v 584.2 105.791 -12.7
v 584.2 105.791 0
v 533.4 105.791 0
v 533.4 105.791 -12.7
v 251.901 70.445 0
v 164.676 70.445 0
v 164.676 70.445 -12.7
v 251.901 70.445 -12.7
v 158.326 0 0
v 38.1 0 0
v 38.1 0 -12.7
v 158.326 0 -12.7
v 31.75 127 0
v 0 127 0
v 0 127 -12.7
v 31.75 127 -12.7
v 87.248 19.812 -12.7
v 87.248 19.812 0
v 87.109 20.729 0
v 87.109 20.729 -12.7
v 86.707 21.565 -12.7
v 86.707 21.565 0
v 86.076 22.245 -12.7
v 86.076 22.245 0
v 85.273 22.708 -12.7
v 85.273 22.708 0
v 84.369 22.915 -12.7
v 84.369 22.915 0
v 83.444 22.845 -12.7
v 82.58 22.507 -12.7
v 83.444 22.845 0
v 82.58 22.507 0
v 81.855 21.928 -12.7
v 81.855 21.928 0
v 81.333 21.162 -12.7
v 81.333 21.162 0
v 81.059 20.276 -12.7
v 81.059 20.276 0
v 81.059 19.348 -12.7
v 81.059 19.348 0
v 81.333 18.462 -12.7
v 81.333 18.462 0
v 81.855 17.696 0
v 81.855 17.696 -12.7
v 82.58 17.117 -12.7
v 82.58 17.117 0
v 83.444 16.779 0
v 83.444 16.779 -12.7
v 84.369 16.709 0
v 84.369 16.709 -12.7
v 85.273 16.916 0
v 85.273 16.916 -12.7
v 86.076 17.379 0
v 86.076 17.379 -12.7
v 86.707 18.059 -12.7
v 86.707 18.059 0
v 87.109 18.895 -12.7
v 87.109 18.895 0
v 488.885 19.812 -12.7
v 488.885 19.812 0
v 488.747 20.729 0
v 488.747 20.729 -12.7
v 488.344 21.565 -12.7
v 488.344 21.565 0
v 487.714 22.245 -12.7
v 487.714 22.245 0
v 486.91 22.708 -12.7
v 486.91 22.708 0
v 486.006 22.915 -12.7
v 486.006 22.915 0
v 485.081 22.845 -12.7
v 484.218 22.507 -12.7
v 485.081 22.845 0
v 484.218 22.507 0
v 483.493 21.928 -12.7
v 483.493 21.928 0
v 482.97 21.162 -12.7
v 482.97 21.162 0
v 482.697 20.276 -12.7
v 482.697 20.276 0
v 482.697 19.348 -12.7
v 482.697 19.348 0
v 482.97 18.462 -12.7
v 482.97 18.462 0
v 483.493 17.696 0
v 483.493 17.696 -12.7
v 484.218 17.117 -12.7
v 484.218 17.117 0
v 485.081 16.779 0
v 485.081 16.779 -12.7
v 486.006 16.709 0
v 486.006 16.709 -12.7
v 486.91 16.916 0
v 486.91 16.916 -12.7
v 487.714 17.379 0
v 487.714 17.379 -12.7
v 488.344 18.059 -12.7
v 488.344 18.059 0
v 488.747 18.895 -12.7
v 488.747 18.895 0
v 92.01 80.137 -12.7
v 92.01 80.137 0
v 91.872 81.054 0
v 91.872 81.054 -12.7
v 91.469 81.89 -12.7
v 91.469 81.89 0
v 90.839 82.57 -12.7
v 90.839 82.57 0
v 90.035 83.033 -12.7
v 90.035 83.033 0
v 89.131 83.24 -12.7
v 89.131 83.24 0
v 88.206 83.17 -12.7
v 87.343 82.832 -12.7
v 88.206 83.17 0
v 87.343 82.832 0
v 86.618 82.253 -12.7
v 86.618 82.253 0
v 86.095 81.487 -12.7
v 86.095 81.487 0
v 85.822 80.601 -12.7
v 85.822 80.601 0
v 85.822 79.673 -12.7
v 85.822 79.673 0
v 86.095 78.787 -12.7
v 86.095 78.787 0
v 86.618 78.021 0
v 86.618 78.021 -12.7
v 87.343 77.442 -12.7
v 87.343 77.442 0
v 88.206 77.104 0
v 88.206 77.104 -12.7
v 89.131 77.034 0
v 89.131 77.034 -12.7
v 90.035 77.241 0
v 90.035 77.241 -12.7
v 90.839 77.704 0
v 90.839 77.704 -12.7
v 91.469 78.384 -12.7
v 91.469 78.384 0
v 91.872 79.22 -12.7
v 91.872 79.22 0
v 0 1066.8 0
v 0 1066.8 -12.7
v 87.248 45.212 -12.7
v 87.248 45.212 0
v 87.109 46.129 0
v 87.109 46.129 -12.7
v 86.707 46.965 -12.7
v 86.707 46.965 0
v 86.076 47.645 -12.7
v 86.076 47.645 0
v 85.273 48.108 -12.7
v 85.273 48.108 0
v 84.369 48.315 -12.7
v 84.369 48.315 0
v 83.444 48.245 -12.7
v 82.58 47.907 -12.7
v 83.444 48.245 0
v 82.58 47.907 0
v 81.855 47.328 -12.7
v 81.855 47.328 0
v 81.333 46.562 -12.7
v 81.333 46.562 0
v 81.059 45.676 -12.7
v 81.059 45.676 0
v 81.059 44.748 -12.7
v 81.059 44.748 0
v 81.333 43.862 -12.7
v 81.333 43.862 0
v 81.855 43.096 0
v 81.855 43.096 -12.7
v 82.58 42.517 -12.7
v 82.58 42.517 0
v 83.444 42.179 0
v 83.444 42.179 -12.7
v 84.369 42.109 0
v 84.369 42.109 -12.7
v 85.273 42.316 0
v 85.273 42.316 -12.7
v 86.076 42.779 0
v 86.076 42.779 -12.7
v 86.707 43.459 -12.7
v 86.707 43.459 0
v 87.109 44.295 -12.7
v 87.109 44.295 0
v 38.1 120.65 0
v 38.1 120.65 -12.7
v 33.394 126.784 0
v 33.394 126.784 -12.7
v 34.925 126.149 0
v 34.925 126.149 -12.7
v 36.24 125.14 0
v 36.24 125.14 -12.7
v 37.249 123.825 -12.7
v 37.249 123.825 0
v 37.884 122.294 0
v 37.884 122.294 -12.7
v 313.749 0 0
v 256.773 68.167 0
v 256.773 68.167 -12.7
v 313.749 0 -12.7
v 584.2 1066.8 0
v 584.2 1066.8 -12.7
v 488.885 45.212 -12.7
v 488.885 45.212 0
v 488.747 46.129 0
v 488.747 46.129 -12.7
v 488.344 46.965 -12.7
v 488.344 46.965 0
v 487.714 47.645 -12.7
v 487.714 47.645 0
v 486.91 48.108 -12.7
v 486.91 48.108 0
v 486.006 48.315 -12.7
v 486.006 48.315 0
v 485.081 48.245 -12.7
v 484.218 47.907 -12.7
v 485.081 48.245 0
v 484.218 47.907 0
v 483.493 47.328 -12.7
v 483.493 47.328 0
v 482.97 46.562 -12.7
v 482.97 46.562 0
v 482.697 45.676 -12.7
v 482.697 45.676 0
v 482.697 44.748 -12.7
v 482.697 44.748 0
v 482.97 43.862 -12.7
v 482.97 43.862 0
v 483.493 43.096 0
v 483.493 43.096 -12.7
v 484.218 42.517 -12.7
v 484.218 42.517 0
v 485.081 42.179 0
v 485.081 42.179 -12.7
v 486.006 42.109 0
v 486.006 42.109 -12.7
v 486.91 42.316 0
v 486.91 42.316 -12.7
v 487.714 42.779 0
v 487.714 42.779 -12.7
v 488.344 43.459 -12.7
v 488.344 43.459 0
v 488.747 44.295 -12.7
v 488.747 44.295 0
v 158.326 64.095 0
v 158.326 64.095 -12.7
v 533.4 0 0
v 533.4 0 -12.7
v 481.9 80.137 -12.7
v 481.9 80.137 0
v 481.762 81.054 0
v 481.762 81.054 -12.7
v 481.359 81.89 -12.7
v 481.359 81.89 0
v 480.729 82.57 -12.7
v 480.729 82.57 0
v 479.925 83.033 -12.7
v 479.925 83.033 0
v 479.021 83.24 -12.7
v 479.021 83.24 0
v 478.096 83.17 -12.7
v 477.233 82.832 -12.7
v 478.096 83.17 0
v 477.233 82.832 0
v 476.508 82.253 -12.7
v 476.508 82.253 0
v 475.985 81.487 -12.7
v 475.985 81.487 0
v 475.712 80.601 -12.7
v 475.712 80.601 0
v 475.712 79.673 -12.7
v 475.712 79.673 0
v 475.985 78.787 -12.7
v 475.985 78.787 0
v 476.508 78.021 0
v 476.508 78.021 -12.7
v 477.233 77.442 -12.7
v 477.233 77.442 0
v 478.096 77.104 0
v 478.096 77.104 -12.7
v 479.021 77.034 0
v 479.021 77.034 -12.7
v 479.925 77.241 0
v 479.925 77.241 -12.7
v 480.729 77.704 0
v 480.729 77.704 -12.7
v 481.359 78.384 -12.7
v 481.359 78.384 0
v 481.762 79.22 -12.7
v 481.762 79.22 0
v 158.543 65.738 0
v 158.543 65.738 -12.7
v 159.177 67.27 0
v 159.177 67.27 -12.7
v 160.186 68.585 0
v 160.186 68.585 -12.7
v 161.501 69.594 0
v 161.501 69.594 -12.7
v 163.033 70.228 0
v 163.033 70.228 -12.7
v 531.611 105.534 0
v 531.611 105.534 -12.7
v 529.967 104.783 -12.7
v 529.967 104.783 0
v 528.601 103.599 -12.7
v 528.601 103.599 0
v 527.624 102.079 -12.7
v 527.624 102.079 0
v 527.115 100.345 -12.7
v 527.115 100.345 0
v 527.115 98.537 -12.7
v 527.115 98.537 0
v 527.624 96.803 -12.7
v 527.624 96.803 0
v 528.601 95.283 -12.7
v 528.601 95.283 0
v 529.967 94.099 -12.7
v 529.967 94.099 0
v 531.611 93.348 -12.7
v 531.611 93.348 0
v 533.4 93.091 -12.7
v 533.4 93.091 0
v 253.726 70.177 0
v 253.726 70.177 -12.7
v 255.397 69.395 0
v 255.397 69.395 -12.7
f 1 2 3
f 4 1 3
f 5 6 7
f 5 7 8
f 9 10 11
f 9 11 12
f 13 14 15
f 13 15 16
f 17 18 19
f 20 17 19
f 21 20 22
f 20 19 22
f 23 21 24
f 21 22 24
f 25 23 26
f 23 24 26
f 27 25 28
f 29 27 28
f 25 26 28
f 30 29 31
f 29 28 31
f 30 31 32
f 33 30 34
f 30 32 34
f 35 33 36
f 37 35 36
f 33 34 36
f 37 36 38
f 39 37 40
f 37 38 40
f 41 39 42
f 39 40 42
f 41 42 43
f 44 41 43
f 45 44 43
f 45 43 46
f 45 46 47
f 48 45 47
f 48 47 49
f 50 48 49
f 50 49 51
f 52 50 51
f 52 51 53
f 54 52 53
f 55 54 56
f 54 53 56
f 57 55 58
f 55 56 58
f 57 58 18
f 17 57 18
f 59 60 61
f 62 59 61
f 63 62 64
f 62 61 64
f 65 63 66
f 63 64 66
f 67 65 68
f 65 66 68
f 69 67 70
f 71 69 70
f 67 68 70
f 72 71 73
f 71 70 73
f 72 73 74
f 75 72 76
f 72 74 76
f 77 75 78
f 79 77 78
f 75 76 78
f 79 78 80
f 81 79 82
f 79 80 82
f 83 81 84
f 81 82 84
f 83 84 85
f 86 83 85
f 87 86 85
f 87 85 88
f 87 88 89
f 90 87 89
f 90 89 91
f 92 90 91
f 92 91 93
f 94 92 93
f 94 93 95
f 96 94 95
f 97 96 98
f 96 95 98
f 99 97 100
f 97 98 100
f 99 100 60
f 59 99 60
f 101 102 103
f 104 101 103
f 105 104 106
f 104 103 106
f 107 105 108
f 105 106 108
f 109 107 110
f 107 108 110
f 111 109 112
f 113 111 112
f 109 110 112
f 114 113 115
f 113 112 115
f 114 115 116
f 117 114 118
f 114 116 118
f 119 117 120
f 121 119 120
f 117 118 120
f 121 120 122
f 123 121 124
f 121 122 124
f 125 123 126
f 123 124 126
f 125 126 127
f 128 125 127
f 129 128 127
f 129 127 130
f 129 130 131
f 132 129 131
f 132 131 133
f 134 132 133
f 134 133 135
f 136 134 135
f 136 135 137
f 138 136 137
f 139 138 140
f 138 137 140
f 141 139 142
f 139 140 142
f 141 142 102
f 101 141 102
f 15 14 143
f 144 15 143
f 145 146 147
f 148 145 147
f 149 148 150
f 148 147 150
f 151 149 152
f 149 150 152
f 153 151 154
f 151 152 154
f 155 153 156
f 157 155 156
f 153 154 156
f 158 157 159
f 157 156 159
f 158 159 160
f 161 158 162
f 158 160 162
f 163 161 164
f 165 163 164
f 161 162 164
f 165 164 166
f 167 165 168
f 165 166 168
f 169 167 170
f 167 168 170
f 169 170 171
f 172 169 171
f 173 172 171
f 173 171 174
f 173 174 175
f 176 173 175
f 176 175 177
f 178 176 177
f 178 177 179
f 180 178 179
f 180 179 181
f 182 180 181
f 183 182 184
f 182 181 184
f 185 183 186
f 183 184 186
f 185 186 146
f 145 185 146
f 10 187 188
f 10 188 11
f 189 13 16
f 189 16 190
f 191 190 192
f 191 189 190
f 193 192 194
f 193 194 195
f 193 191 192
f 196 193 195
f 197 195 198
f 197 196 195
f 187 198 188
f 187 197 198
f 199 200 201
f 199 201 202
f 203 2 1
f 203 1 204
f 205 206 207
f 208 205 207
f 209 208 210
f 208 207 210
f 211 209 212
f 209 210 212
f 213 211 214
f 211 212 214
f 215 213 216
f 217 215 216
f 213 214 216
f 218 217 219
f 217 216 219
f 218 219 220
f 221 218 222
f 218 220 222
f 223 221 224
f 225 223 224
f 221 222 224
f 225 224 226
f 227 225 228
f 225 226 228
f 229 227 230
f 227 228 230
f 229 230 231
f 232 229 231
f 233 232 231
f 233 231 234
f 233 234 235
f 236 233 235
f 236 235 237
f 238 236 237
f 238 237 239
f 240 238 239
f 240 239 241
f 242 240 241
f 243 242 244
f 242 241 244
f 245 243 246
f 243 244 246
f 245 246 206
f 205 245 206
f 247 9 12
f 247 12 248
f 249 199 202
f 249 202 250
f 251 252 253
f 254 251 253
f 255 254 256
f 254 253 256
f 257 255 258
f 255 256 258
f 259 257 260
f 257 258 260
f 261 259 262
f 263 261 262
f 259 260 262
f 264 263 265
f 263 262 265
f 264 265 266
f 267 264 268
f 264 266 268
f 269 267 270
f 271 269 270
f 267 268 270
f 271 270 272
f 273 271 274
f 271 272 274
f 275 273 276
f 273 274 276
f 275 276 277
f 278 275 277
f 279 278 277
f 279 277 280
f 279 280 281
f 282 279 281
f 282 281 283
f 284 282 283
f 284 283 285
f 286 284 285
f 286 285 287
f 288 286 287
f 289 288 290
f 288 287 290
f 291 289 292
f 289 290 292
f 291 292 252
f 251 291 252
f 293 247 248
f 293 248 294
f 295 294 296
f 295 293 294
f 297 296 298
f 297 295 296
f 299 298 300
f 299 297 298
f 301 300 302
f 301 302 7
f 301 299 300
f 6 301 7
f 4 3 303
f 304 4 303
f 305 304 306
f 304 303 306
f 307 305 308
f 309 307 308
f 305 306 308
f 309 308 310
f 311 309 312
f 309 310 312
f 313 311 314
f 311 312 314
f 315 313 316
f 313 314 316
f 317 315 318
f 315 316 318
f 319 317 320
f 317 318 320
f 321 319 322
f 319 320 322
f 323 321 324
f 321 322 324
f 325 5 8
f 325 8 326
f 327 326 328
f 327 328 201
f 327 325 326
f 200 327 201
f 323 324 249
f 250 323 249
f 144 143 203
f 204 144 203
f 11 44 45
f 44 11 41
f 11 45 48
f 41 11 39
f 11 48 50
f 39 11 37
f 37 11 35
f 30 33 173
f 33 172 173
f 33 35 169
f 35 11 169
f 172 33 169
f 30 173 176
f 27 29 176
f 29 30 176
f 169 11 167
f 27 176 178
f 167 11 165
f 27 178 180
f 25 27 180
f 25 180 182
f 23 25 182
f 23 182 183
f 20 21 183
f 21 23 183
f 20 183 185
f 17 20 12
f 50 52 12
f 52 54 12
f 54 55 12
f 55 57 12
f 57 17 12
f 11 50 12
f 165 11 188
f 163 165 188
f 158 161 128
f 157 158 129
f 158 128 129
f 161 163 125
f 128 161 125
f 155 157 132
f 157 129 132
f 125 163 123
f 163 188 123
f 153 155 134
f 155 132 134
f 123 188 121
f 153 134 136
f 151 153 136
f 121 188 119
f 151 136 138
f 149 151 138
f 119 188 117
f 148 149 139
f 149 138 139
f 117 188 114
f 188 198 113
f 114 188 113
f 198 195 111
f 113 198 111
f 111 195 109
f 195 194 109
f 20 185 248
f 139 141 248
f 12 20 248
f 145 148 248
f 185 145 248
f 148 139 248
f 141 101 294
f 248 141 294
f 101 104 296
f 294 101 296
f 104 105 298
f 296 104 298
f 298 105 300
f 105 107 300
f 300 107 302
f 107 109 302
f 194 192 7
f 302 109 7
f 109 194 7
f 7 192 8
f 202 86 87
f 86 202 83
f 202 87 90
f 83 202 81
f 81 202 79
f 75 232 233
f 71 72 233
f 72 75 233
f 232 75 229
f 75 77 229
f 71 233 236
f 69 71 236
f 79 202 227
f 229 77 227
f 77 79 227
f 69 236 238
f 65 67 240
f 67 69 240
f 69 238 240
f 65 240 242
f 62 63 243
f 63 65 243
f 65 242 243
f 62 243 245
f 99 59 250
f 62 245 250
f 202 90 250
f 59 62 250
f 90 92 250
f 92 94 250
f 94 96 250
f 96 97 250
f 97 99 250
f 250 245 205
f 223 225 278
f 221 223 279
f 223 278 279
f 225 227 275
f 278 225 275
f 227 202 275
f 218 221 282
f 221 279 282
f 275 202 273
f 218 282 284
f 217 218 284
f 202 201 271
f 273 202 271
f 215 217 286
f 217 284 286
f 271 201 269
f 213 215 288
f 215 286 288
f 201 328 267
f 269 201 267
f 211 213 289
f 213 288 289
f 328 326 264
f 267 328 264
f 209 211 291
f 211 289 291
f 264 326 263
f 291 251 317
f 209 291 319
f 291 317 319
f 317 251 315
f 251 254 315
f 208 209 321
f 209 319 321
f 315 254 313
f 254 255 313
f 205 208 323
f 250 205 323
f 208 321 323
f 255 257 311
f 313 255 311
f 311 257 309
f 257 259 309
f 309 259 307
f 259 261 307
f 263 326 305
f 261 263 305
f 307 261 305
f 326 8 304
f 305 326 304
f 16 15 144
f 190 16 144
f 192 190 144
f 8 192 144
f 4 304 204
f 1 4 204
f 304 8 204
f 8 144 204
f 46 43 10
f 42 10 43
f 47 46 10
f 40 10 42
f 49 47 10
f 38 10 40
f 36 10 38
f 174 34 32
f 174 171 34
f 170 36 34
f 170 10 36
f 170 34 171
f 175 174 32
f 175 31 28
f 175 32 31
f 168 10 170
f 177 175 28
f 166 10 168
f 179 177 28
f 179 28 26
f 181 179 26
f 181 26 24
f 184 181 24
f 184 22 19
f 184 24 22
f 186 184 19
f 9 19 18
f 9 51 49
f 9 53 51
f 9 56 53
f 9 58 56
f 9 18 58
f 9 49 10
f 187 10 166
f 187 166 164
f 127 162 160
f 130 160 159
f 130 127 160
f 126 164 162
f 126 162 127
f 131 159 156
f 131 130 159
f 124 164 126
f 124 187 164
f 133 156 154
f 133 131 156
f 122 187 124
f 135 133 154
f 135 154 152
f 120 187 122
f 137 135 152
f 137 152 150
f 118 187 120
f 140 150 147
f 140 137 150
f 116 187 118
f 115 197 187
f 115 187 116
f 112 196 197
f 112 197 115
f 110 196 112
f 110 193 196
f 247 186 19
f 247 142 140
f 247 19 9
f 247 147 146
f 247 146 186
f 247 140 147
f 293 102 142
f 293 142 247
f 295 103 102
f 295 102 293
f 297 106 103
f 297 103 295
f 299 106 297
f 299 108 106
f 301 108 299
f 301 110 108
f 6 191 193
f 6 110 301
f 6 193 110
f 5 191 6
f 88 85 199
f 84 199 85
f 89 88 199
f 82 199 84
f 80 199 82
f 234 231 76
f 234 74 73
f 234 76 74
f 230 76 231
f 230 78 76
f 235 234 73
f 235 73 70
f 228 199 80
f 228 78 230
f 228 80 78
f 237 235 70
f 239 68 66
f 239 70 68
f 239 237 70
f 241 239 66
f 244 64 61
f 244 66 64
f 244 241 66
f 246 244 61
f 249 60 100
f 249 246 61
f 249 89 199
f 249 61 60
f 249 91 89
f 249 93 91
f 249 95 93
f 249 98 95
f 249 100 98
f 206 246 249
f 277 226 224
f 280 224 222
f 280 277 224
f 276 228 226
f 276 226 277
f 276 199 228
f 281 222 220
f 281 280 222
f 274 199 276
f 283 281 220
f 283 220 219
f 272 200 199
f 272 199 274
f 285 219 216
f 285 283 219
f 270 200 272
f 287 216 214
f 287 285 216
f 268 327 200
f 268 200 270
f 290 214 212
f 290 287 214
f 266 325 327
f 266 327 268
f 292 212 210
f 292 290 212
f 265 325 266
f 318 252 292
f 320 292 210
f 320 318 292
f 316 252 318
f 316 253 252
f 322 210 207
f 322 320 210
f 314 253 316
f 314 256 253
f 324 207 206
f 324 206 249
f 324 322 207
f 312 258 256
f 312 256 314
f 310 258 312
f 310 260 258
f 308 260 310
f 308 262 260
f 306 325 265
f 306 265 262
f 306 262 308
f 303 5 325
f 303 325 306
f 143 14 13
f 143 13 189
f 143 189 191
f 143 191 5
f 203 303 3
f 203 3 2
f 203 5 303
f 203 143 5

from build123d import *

# Parameters (mm, degrees)
PLAYFIELD_BLANK_W         = 584.2
PLAYFIELD_BLANK_H         = 1066.8
PLAYFIELD_THICKNESS_DEPTH = 12.7
SKETCH3_R                 = 3.1115
CUT_EXTRUDE1_DEPTH        = 12.7
CUT_EXTRUDE2_DEPTH        = 12.7
CUT_EXTRUDE3_DEPTH        = 12.7
CUT_EXTRUDE4_DEPTH        = 12.7


with BuildPart() as part:
    # Playfield_Blank → Playfield_Thickness (new body)
    with BuildSketch(Plane.XY):
        with Locations((292.1, 533.4)):
            Rectangle(PLAYFIELD_BLANK_W, PLAYFIELD_BLANK_H)
    extrude(amount=-PLAYFIELD_THICKNESS_DEPTH)

    # Sketch3 → Cut-Extrude1 (cut)
    with BuildSketch(Plane.XY):
        with Locations((84.136105728, 19.812)):
            Circle(SKETCH3_R)
        with Locations((84.136105728, 45.212)):
            Circle(SKETCH3_R)
        with Locations((88.898605728, 80.137)):
            Circle(SKETCH3_R)
        with Locations((485.773605728, 19.812)):
            Circle(SKETCH3_R)
        with Locations((485.773605728, 45.212)):
            Circle(SKETCH3_R)
        with Locations((478.788605728, 80.137)):
            Circle(SKETCH3_R)
    extrude(amount=-CUT_EXTRUDE1_DEPTH, mode=Mode.SUBTRACT)

    # Sketch4 → Cut-Extrude2 (cut)
    with BuildSketch(Plane.XY):
        with BuildLine():
            Line((0, 127), (31.75, 127))
            ThreePointArc((31.75, 127), (36.240128061, 125.140128061), (38.1, 120.65))
            Line((38.1, 120.65), (38.1, 0))
            Line((38.1, 0), (0, 0))
            Line((0, 0), (0, 127))
        make_face()
    extrude(amount=-CUT_EXTRUDE2_DEPTH, mode=Mode.SUBTRACT)

    # Sketch5 → Cut-Extrude3 (cut)
    with BuildSketch(Plane.XY):
        with BuildLine():
            Line((584.2, 105.791), (533.4, 105.791))
            ThreePointArc((533.4, 105.791), (527.05, 99.441), (533.4, 93.091))
            Line((533.4, 93.091), (533.4, 0))
            Line((533.4, 0), (584.2, 0))
            Line((584.2, 0), (584.2, 105.791))
        make_face()
    extrude(amount=-CUT_EXTRUDE3_DEPTH, mode=Mode.SUBTRACT)

    # Sketch7 → Cut-Extrude4 (cut)
    with BuildSketch(Plane.XY):
        with BuildLine():
            Line((158.326337108, 0), (158.326337108, 64.094614523))
            ThreePointArc((158.326337108, 64.094614523), (160.186209048, 68.584742584), (164.676337108, 70.444614523))
            Line((164.676337108, 70.444614523), (251.90120893, 70.444614523))
            ThreePointArc((251.90120893, 70.444614523), (254.5903795, 69.847080224), (256.773448763, 68.16693315))
            Line((256.773448763, 68.16693315), (313.748778564, 0))
            Line((313.748778564, 0), (158.326337108, 0))
        make_face()
    extrude(amount=-CUT_EXTRUDE4_DEPTH, mode=Mode.SUBTRACT)


solid = part.part
